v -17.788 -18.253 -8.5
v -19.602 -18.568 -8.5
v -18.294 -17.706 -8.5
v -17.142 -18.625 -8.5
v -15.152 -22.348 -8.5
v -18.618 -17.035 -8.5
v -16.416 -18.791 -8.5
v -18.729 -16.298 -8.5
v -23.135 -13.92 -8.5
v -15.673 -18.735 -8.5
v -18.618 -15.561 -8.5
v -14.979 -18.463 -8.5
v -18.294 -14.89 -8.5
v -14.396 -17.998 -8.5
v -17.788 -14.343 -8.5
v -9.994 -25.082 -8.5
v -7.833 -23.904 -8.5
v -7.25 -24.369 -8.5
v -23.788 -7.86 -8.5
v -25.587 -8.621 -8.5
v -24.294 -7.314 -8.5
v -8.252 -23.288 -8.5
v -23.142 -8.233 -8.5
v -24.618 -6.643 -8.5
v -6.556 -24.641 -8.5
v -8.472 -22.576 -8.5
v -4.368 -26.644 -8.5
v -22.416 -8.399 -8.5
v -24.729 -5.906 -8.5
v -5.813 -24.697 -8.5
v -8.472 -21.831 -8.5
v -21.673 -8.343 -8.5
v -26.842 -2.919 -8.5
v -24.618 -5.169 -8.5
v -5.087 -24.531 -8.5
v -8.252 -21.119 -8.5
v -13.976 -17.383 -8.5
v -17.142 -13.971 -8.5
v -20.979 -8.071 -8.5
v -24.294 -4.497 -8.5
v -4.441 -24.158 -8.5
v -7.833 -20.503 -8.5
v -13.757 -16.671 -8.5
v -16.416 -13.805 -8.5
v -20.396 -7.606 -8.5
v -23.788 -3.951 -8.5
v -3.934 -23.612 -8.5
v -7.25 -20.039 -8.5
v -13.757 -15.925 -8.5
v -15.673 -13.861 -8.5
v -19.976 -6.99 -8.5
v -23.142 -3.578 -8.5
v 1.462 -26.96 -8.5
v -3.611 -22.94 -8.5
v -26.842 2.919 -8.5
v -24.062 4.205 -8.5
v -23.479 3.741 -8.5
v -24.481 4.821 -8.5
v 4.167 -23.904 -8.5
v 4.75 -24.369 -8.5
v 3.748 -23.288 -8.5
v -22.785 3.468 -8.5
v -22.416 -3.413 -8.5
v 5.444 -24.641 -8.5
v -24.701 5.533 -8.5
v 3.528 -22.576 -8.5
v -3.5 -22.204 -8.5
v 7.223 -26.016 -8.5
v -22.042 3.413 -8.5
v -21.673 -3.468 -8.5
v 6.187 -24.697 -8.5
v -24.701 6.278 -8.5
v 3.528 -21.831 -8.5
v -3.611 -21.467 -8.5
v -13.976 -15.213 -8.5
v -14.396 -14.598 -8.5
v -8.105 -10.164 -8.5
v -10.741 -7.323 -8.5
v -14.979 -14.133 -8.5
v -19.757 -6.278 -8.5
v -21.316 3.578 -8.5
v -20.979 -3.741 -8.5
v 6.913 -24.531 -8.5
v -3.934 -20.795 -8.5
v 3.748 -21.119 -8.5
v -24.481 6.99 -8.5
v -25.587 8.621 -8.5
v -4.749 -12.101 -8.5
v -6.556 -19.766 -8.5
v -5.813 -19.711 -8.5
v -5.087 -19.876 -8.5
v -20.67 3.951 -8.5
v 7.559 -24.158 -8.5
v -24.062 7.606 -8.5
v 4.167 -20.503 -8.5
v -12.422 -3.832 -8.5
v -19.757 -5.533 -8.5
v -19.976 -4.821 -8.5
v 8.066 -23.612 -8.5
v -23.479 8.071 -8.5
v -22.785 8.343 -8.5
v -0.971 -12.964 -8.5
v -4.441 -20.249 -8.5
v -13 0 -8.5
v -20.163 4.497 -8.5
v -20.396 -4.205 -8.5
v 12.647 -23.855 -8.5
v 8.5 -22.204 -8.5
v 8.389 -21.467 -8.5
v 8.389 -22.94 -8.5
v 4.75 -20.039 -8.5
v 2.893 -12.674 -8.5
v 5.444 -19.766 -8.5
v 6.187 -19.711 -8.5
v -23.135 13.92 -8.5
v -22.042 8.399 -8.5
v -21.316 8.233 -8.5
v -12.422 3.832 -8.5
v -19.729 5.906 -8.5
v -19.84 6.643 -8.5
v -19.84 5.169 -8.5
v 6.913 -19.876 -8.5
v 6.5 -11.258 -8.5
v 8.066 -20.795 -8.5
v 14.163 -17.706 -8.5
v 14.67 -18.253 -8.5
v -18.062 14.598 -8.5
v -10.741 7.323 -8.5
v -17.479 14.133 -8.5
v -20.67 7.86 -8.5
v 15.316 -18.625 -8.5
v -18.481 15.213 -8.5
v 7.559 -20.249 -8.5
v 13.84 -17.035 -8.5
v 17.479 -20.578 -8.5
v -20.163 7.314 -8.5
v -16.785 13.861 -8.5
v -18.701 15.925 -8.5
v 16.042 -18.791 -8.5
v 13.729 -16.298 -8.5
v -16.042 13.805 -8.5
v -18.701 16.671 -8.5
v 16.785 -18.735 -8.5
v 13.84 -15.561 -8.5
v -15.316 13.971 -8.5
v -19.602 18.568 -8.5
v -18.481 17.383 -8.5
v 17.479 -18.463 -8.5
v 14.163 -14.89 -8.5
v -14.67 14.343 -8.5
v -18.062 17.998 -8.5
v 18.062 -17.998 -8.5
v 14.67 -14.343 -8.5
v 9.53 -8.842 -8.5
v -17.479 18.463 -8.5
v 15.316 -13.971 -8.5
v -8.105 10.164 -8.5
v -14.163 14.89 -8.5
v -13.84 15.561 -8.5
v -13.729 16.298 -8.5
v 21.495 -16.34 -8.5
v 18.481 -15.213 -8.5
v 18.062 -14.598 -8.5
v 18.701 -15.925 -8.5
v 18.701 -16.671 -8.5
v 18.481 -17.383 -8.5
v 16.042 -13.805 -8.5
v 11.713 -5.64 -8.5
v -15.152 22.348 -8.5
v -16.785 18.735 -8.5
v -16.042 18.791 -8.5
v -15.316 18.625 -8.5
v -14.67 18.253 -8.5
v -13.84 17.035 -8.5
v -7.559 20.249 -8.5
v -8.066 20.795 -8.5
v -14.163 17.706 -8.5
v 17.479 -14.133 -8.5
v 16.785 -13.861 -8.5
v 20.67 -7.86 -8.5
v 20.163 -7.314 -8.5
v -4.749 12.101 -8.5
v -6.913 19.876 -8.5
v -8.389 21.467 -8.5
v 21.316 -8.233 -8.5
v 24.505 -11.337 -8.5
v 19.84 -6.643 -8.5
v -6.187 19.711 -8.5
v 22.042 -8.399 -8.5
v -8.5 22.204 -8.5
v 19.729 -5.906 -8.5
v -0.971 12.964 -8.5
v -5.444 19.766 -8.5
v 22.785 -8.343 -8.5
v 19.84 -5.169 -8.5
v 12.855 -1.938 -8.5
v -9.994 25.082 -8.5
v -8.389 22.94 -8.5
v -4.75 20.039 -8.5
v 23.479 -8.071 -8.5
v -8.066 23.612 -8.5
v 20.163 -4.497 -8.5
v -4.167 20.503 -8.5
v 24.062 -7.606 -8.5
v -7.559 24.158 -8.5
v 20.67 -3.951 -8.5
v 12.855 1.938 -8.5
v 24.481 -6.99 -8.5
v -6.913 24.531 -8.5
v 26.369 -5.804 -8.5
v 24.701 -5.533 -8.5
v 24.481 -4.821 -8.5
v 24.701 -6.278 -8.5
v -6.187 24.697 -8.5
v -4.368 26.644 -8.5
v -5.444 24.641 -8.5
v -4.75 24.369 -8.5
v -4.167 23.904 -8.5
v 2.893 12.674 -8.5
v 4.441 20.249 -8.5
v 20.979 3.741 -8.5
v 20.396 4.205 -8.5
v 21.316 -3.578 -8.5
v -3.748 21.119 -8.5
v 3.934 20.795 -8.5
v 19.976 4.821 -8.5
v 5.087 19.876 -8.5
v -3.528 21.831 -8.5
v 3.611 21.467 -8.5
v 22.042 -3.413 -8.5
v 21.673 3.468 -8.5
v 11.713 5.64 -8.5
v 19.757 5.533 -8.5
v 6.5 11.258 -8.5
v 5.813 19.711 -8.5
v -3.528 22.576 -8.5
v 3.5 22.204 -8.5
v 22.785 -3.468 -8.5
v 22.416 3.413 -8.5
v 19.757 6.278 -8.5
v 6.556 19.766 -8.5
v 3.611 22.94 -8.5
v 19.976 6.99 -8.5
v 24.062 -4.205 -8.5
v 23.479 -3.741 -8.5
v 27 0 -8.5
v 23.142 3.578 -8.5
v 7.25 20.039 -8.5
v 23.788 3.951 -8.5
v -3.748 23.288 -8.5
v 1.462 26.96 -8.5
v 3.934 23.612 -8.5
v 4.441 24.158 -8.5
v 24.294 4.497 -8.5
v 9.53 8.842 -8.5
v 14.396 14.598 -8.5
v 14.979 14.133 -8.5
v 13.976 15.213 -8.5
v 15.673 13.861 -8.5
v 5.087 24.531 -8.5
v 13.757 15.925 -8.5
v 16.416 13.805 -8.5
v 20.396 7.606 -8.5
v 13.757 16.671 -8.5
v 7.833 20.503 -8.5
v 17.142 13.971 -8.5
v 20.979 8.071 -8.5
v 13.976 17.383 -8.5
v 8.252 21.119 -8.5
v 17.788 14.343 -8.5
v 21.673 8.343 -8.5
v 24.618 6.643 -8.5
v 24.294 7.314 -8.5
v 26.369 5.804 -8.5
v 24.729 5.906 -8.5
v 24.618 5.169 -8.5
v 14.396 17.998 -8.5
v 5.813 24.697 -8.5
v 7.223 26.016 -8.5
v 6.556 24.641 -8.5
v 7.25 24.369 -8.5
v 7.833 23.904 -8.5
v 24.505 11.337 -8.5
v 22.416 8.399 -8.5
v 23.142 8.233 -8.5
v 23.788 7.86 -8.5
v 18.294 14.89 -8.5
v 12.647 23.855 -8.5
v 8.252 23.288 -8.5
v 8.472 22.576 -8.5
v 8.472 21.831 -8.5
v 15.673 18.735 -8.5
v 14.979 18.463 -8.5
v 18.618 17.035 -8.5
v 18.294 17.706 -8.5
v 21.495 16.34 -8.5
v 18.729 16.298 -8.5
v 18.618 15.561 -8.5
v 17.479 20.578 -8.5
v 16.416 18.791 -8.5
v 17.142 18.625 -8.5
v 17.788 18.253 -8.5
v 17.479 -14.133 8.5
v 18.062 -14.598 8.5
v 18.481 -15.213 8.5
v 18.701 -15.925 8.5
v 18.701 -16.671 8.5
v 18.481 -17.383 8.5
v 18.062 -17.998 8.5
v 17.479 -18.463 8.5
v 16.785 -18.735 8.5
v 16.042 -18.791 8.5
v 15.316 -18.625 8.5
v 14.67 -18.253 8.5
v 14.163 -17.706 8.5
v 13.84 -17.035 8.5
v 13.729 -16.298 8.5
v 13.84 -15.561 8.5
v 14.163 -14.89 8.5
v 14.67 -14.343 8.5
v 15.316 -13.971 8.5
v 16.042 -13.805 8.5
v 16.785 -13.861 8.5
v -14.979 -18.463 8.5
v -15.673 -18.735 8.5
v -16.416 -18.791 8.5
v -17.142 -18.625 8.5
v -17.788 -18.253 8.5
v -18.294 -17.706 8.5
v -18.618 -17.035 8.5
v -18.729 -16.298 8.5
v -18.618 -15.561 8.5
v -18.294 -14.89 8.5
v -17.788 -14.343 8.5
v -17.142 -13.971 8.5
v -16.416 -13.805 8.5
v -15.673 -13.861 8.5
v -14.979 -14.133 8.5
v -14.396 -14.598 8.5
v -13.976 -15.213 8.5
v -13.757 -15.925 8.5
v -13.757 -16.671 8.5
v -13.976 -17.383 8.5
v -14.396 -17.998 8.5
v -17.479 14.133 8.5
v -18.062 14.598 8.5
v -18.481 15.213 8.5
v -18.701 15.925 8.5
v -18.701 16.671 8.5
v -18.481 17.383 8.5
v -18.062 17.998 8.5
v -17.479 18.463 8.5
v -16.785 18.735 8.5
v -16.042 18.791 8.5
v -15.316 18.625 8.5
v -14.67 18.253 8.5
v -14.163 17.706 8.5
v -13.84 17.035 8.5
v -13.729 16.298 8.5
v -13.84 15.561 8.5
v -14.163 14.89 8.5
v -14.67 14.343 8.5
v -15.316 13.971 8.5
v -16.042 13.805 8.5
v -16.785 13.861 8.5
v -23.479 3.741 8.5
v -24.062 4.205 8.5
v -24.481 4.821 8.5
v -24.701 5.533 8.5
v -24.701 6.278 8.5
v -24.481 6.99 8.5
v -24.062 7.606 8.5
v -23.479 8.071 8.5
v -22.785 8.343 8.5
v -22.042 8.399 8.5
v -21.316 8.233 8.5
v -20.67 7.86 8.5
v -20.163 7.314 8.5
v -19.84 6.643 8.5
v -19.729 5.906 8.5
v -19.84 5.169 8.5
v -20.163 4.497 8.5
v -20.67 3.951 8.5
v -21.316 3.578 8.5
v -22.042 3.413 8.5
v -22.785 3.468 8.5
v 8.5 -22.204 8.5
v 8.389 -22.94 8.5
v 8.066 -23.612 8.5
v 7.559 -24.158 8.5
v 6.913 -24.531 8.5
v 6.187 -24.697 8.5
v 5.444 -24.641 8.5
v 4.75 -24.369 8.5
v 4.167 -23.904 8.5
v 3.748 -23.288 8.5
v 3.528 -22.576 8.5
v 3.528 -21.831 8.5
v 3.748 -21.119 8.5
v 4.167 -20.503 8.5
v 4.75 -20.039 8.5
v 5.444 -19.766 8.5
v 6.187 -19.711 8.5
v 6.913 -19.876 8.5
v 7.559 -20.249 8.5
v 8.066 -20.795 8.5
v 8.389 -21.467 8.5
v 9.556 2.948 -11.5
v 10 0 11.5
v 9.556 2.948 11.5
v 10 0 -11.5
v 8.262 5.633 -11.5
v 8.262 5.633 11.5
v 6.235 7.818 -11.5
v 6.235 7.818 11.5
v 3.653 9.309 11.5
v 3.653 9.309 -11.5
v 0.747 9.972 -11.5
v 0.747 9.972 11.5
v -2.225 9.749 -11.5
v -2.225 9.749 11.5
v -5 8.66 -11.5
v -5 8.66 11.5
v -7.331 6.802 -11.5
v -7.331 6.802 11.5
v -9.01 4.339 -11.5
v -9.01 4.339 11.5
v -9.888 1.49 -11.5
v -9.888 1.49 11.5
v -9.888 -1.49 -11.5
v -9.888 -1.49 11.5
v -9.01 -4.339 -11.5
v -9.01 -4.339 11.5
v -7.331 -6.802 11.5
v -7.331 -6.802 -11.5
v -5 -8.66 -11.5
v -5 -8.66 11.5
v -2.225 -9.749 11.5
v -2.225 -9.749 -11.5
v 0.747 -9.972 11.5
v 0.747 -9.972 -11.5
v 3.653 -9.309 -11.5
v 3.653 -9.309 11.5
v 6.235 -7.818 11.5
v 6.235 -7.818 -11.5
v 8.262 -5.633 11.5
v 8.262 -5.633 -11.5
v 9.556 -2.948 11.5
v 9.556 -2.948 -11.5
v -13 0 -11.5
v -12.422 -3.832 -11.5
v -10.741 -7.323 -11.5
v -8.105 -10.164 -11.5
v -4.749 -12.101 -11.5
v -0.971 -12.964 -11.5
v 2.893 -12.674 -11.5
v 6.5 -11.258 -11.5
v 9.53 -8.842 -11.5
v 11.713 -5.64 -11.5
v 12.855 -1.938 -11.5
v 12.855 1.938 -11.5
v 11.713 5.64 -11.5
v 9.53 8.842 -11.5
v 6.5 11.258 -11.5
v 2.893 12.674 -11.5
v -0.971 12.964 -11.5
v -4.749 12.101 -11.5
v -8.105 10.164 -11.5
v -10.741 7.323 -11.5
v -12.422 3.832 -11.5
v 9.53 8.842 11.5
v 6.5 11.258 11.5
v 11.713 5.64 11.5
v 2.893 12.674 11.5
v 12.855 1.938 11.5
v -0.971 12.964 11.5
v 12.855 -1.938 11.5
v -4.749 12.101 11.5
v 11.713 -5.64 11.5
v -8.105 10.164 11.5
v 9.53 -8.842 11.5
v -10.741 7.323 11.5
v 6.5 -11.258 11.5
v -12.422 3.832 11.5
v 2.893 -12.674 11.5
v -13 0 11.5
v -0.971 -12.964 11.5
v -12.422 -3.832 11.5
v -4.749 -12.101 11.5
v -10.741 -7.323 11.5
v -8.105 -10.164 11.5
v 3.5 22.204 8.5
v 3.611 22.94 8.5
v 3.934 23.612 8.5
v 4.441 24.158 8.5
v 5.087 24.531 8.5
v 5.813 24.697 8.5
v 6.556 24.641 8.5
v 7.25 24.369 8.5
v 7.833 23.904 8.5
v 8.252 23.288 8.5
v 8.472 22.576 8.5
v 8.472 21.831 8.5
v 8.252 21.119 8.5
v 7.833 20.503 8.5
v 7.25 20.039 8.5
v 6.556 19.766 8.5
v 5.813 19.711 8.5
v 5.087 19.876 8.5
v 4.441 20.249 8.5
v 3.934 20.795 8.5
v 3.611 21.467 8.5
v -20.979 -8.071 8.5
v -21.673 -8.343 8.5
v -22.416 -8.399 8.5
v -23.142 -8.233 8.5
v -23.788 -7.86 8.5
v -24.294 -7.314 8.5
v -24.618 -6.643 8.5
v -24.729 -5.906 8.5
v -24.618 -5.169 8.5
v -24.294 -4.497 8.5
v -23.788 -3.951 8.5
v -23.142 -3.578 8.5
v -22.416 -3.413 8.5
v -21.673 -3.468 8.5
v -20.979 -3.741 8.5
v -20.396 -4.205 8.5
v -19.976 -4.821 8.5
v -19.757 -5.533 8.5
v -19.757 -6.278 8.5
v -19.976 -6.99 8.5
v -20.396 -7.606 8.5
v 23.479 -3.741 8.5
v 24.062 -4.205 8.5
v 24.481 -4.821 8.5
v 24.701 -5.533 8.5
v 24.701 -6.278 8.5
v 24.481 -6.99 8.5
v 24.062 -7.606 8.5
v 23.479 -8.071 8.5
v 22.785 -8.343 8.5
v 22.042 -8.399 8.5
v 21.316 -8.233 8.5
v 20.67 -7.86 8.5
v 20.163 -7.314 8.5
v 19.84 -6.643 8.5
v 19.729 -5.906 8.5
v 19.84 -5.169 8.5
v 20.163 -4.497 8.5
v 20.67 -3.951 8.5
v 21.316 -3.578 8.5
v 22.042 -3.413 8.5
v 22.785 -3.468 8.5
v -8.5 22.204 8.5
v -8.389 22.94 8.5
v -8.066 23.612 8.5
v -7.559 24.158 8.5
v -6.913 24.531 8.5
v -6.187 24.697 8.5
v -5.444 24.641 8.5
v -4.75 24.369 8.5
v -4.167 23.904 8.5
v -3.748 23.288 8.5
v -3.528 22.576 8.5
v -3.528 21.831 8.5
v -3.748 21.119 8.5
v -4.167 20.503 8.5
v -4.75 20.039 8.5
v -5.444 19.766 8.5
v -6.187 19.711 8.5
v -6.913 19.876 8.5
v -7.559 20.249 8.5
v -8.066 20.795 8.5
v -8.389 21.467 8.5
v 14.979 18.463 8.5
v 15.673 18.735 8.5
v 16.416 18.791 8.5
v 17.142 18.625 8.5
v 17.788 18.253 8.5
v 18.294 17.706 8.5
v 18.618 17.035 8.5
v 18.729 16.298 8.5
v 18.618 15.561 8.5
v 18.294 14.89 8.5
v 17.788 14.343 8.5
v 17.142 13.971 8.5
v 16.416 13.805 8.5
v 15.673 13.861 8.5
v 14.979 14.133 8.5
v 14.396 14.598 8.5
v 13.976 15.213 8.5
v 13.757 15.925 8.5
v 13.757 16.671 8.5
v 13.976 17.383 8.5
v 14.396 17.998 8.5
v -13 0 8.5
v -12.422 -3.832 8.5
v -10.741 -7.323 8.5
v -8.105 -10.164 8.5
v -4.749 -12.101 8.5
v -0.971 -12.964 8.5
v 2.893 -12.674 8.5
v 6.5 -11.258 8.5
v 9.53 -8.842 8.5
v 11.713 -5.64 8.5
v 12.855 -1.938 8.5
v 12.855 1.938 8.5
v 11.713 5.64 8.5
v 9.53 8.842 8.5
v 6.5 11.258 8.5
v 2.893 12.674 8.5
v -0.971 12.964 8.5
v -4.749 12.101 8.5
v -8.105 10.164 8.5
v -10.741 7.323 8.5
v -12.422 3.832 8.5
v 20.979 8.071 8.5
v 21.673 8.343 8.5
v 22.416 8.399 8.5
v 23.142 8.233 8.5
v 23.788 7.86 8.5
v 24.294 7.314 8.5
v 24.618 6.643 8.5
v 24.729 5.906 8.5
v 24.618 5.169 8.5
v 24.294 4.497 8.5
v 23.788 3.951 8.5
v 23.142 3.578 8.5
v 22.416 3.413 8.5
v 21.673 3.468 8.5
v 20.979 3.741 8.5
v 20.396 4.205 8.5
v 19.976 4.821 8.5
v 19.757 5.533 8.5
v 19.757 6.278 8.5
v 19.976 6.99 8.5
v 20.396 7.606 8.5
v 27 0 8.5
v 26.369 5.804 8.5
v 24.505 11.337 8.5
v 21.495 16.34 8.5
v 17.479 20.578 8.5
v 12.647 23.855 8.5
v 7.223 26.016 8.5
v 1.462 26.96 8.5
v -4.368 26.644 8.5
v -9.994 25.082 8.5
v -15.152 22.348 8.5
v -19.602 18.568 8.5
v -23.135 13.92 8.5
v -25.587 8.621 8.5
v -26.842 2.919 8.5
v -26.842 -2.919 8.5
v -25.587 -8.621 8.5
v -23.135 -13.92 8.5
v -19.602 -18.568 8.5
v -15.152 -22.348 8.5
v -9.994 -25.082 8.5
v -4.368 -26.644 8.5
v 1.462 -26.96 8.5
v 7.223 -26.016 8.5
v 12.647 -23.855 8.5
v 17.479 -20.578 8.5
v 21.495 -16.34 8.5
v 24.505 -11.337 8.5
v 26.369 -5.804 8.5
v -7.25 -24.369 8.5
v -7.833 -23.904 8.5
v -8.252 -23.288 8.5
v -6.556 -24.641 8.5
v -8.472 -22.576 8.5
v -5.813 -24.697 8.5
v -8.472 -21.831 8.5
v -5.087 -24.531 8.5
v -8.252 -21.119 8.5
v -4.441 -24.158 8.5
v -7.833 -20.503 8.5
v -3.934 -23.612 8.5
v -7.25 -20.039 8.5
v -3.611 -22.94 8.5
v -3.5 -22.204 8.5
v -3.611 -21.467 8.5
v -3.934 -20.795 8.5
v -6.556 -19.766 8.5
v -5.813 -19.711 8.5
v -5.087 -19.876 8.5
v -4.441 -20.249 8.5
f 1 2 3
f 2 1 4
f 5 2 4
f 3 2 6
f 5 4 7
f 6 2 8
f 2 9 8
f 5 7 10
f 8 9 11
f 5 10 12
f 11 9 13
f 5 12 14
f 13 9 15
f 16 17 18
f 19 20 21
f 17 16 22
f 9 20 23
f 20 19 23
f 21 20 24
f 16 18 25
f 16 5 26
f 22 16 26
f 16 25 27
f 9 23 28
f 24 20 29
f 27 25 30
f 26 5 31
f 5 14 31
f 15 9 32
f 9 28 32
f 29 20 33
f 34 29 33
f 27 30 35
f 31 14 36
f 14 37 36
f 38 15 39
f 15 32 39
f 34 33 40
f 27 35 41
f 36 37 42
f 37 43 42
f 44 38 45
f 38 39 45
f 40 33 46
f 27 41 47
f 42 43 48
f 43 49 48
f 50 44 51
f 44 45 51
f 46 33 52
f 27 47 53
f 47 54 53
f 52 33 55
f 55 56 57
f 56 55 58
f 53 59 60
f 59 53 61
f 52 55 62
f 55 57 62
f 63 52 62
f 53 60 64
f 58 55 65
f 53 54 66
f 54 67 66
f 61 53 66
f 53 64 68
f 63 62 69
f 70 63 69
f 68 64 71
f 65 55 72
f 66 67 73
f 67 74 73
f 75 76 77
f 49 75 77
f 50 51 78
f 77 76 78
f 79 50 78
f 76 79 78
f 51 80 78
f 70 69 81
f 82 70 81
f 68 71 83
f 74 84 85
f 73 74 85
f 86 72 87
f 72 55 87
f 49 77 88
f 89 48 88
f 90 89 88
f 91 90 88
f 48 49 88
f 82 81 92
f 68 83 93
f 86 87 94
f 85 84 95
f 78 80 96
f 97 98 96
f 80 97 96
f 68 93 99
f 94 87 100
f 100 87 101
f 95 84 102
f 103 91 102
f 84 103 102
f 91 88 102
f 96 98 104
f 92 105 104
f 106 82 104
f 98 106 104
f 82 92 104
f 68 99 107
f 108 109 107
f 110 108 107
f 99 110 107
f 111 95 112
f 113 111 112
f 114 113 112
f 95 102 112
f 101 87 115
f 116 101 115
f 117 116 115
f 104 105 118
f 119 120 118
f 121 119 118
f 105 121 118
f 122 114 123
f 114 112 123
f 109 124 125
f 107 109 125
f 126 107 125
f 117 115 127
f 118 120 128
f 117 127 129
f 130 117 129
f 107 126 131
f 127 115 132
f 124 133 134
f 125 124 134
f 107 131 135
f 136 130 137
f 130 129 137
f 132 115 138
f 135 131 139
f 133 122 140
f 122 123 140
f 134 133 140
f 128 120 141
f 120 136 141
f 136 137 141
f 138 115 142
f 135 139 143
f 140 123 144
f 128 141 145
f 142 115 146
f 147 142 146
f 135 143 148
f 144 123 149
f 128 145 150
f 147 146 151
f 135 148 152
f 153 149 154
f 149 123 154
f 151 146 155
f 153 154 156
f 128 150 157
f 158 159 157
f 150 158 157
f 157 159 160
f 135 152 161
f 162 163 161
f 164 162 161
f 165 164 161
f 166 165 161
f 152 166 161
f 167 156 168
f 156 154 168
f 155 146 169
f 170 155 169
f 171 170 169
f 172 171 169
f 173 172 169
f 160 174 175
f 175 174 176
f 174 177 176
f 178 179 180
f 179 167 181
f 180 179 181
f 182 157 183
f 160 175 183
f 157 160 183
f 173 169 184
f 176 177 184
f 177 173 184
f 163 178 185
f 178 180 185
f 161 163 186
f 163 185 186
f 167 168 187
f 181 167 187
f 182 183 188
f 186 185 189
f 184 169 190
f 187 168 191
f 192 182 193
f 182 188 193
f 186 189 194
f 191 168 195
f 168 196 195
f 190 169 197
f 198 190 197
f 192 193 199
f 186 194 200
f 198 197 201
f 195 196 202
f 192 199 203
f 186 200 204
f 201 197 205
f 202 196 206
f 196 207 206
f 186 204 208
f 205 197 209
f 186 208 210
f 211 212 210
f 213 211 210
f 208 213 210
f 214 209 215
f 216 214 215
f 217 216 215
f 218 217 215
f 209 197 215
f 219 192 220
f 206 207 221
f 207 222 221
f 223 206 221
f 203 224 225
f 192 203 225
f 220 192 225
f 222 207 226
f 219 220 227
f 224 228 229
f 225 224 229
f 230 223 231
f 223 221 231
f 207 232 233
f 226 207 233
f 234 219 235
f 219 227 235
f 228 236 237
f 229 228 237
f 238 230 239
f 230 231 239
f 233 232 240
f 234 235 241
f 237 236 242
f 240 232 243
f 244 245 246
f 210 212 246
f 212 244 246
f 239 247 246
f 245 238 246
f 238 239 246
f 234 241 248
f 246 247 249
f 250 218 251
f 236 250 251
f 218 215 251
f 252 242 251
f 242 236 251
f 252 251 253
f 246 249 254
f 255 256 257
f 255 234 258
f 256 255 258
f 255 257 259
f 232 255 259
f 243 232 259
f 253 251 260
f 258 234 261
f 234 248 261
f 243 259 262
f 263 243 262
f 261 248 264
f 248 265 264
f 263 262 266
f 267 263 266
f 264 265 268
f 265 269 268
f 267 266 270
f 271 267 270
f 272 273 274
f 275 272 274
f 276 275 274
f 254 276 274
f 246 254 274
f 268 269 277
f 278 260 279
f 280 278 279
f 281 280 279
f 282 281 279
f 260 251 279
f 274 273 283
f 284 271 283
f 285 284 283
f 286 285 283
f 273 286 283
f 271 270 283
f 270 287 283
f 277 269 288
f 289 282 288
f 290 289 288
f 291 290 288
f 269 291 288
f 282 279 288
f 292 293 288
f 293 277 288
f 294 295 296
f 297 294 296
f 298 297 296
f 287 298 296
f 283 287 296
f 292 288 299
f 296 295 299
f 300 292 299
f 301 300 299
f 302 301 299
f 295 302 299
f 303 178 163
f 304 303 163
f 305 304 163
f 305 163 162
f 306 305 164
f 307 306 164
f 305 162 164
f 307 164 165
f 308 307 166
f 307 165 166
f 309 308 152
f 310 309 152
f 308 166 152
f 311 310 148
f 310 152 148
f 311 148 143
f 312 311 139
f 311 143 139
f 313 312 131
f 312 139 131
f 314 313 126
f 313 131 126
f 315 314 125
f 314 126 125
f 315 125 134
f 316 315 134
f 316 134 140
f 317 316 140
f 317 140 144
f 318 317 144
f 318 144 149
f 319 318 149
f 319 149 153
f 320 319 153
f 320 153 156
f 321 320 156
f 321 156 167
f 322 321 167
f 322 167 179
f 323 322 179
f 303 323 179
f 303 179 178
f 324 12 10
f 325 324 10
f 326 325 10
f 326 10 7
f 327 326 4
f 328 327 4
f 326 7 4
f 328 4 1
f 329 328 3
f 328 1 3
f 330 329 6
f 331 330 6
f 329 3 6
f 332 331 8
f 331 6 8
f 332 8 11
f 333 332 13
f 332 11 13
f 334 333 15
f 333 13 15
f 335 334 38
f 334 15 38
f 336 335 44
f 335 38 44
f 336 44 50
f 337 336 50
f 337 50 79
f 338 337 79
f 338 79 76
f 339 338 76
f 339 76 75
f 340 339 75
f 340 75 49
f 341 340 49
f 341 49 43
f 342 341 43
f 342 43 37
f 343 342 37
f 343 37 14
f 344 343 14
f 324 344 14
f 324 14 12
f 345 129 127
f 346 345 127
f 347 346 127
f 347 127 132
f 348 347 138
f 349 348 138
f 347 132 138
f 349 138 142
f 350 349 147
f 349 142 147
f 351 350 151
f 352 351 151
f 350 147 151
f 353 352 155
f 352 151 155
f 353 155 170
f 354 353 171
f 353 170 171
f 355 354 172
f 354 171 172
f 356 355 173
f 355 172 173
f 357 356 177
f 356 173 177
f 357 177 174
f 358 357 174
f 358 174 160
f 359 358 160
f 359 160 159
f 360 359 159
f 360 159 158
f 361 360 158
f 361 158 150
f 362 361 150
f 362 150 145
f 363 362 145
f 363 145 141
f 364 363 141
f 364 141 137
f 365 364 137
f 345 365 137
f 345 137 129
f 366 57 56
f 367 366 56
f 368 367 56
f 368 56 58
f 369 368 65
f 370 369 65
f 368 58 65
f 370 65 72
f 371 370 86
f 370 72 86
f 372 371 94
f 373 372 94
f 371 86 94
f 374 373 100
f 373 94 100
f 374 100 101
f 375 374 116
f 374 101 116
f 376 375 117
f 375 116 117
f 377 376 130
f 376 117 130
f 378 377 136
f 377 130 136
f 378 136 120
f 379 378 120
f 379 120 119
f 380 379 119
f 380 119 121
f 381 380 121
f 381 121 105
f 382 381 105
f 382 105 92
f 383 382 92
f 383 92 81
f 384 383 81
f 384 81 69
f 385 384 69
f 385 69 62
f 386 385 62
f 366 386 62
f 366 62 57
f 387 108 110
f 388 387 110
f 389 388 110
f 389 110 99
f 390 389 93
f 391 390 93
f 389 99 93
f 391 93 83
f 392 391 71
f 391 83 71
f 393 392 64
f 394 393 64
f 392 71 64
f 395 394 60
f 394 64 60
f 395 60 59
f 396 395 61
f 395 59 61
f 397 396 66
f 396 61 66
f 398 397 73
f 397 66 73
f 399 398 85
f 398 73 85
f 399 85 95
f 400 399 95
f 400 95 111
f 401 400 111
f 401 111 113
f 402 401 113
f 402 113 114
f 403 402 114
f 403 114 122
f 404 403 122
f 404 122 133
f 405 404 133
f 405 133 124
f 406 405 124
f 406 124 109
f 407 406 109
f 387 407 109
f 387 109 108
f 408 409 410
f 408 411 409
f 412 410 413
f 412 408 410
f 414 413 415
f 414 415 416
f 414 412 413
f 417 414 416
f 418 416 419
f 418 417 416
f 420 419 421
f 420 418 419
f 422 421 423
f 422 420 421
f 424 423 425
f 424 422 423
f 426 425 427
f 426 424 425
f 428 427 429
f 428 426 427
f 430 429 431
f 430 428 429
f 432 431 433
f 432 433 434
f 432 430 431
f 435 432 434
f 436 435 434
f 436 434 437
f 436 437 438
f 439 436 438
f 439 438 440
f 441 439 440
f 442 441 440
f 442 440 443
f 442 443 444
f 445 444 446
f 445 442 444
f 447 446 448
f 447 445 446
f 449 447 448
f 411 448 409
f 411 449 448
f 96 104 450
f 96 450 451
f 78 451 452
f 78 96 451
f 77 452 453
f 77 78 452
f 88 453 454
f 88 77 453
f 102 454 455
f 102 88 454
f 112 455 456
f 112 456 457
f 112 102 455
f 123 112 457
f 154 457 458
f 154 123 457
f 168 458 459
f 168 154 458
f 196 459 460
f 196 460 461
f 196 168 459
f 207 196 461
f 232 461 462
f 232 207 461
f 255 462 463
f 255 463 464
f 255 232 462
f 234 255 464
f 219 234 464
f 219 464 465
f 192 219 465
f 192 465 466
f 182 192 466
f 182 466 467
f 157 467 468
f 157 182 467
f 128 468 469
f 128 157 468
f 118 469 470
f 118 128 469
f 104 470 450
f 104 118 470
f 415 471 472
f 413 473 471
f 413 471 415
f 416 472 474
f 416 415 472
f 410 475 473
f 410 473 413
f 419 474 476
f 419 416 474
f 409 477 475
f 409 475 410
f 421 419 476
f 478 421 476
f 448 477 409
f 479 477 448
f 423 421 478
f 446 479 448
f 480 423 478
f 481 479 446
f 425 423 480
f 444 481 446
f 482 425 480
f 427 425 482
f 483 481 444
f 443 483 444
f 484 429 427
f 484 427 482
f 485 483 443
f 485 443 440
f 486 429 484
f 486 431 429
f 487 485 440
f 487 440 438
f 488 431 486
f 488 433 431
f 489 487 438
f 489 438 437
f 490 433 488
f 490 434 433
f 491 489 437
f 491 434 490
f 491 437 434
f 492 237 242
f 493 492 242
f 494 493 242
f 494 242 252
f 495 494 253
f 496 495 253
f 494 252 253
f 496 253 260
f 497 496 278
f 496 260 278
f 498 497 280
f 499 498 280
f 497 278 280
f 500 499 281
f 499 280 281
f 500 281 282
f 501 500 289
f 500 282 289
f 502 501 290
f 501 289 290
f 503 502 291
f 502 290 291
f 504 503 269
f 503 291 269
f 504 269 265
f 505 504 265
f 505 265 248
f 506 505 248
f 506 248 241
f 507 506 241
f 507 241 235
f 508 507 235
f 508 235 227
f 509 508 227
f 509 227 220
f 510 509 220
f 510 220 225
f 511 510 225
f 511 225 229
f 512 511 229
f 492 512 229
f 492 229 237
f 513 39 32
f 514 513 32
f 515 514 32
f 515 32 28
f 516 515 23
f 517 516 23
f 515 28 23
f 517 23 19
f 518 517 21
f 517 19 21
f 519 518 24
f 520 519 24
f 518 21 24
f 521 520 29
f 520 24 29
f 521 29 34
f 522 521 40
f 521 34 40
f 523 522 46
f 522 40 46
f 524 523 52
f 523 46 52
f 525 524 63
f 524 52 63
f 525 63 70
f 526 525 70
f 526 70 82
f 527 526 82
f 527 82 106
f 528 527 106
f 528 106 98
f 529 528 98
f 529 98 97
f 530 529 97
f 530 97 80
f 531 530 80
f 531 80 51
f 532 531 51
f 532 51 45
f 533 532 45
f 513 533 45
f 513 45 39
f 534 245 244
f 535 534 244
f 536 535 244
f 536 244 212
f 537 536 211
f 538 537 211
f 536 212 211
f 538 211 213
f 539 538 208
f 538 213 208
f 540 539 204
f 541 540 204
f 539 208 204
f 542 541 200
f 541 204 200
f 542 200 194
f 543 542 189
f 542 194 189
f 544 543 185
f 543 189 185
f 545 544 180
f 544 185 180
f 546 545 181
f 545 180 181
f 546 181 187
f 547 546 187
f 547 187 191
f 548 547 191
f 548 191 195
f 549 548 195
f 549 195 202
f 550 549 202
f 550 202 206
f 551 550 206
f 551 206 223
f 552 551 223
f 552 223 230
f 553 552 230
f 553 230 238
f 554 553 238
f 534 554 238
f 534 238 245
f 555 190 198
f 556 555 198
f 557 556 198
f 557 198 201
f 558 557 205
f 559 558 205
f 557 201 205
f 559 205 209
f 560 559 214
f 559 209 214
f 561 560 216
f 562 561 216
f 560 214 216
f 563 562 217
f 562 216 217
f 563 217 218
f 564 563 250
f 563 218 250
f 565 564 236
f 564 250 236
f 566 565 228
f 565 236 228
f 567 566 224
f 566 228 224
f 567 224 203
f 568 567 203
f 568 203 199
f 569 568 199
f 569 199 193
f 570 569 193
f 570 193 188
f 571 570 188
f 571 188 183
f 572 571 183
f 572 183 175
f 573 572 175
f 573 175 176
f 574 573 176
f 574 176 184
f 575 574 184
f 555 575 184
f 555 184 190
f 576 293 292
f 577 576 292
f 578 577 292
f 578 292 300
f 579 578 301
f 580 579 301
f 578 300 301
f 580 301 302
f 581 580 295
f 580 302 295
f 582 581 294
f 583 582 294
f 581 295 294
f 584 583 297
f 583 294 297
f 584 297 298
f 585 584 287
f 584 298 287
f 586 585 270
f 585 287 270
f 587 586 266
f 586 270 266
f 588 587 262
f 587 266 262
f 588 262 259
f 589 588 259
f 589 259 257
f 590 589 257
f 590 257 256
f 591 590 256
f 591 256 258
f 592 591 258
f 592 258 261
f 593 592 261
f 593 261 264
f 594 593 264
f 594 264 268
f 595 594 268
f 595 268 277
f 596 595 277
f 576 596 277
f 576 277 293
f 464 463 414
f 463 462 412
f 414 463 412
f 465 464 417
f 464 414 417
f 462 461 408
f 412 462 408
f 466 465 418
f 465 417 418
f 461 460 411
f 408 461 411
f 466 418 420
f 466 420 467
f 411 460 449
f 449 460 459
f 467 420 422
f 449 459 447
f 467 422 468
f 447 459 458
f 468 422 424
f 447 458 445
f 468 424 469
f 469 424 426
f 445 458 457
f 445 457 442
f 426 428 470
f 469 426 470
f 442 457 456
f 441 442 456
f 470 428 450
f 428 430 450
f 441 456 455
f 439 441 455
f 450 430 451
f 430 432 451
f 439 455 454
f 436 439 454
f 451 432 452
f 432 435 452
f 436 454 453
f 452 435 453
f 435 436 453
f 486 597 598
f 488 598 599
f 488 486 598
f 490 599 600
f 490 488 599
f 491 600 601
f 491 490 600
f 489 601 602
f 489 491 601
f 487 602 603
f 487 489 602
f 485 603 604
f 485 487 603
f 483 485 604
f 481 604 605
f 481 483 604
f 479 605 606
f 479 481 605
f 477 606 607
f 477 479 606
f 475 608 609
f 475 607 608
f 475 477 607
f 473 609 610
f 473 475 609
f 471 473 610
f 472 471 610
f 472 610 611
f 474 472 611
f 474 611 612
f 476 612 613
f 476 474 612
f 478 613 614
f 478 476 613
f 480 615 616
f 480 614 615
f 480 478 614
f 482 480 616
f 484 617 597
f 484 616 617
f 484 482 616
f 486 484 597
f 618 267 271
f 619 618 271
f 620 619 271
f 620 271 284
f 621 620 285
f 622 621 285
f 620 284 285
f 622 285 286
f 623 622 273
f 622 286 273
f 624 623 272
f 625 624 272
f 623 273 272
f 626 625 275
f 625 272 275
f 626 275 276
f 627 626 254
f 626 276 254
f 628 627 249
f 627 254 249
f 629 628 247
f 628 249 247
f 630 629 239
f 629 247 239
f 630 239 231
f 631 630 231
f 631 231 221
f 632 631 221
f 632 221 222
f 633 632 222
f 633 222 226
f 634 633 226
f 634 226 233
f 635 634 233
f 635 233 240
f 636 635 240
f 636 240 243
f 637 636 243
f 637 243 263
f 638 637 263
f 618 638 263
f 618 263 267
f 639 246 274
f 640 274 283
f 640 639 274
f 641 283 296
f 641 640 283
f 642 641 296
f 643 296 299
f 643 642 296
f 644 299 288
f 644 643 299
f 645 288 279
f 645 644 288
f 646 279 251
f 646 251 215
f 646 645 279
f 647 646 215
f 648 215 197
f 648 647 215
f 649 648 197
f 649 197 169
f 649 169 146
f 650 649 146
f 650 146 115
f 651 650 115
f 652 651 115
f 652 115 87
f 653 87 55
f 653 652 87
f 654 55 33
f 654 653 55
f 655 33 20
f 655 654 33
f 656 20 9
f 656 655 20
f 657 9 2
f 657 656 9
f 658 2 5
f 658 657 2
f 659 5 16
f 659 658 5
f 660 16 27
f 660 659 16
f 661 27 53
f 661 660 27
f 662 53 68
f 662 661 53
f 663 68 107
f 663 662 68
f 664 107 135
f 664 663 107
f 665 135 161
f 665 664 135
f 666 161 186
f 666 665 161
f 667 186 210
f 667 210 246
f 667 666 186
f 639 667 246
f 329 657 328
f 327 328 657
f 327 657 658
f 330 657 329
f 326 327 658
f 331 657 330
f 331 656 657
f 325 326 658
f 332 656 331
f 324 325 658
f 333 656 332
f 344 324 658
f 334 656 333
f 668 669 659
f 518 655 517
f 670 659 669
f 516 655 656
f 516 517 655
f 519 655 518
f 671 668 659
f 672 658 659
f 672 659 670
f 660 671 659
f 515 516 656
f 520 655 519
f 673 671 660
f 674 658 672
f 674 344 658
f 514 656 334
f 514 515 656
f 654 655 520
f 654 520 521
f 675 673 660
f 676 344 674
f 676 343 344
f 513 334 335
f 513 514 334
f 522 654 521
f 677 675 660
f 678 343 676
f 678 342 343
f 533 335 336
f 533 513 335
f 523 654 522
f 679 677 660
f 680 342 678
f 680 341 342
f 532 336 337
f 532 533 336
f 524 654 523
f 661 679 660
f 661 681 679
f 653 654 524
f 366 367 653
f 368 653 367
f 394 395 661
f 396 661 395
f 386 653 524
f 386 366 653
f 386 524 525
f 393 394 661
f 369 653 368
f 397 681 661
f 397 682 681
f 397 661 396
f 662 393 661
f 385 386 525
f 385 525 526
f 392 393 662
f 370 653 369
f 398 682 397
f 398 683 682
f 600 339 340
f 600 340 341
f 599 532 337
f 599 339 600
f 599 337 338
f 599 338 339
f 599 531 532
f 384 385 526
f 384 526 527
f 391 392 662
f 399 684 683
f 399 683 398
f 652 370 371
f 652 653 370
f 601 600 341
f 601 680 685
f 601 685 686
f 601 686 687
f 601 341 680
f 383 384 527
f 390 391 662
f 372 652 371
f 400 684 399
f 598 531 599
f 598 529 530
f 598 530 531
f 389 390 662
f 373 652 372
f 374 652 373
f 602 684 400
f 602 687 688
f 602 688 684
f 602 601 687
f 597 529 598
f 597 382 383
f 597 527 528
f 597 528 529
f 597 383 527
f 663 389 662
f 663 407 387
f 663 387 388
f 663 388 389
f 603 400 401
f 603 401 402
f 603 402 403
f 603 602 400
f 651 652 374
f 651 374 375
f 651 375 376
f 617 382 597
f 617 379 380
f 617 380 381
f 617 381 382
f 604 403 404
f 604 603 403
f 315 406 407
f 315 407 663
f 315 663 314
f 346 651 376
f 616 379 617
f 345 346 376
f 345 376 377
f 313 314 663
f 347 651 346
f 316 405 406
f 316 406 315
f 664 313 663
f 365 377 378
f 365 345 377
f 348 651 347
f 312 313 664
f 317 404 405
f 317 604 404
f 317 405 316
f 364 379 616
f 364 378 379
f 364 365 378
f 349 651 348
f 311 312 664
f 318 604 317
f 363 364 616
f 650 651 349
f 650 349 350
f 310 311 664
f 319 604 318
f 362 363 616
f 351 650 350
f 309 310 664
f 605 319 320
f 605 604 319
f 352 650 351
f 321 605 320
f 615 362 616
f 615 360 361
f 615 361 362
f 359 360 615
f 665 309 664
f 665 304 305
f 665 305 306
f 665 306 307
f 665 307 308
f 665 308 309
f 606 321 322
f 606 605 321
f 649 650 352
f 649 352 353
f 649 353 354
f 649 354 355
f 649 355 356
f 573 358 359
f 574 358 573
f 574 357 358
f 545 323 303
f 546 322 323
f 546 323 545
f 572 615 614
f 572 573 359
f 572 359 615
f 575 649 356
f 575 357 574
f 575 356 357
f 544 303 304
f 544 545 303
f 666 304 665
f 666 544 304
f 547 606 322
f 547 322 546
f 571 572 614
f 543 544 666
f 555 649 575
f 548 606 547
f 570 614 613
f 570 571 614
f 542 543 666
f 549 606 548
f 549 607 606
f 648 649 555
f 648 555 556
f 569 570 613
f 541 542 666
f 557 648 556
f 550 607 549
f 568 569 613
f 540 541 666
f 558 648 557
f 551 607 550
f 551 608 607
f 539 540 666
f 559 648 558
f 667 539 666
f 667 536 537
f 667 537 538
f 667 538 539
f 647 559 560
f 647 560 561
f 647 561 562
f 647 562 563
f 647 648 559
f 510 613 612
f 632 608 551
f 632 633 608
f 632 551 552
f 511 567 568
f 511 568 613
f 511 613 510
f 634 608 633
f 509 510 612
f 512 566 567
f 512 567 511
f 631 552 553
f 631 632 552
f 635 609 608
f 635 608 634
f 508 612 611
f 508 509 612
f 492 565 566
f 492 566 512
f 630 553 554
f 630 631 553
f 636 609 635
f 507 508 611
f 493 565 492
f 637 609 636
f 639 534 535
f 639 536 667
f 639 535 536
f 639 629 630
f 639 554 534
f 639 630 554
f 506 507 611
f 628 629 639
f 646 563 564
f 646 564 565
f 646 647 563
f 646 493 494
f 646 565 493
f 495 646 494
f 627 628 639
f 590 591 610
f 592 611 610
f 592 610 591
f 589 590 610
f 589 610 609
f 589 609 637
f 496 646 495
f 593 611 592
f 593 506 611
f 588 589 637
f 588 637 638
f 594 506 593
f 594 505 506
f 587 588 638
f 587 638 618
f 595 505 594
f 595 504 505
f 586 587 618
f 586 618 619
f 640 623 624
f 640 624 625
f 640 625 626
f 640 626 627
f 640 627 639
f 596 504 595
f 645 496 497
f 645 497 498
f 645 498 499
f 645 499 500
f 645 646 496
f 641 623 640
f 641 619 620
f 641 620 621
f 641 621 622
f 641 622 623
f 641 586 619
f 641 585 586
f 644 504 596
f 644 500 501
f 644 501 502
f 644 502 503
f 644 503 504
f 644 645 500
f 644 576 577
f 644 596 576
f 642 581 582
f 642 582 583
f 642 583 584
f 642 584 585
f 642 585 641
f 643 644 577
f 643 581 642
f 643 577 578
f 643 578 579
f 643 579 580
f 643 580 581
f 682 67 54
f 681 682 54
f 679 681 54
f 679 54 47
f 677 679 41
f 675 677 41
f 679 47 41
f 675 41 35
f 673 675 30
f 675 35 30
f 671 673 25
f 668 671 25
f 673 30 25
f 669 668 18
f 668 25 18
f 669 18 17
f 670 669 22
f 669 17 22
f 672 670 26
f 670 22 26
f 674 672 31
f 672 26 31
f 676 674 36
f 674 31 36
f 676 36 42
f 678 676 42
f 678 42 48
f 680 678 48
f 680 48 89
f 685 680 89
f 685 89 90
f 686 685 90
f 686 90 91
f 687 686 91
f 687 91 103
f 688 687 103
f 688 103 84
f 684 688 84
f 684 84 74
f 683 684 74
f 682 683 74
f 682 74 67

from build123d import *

# Parameters (mm, degrees)
SKETCH_3_R               = 27
EXTRUDE_1_DEPTH          = 8.5
SKETCH_5_R               = 13
CUT_EXTRUDE_2_DEPTH      = 42.797129088
SKETCH_8_R               = 13
SKETCH_8_R_2             = 10
EXTRUDE_2_DEPTH          = 11.5
CUT_EXTRUDE_3_REACH      = 45.105
SKETCH_9_R               = 2.5
PATTERN_CIRCULAR_2_COUNT = 6


with BuildPart() as part:
    # 草图3 → 凸台-拉伸1 (new, symmetric)
    with BuildSketch(Plane.XY):
        Circle(SKETCH_3_R)
    extrude(amount=EXTRUDE_1_DEPTH, both=True)

    # 草图5 → 切除-拉伸2 (cut, through all)
    with BuildSketch(Plane(origin=(0, 0, -8.5), x_dir=(-1, 0, 0), z_dir=(0, 0, -1))):
        Circle(SKETCH_5_R)
    extrude(amount=-CUT_EXTRUDE_2_DEPTH, mode=Mode.SUBTRACT)

    # 草图8 → 凸台-拉伸2 (add, symmetric)
    with BuildSketch(Plane.XY):
        with Locations(Location((0, 0, 0), (0, 0, 180))):
            Circle(SKETCH_8_R)
        Circle(SKETCH_8_R_2, mode=Mode.SUBTRACT)
    extrude(amount=EXTRUDE_2_DEPTH, both=True)

    # 草图9 → 切除-拉伸3 (cut, up to next)
    with BuildSketch(Plane(origin=(0, 0, -8.5), x_dir=(-1, 0, 0), z_dir=(0, 0, -1)), mode=Mode.PRIVATE) as cut_extrude_3_sk1:
        with Locations((-6, 22.203603311)):
            Circle(SKETCH_9_R)
    cut_extrude_3_tool1 = extrude(cut_extrude_3_sk1.sketch, amount=-CUT_EXTRUDE_3_REACH, mode=Mode.PRIVATE) & part.part
    # 草图9 → 切除-拉伸3 (cut, up to next)
    with BuildSketch(Plane(origin=(0, 0, -8.5), x_dir=(-1, 0, 0), z_dir=(0, 0, -1)), mode=Mode.PRIVATE) as cut_extrude_3_sk2:
        with Locations((6, 22.203603311)):
            Circle(SKETCH_9_R)
    cut_extrude_3_tool2 = extrude(cut_extrude_3_sk2.sketch, amount=-CUT_EXTRUDE_3_REACH, mode=Mode.PRIVATE) & part.part
    cut_extrude_3_1 = cut_extrude_3_tool1.solids().sort_by_distance((6, 22.203603, -8.5))[0]
    add(cut_extrude_3_1, mode=Mode.SUBTRACT)
    cut_extrude_3_2 = cut_extrude_3_tool2.solids().sort_by_distance((-6, 22.203603, -8.5))[0]
    add(cut_extrude_3_2, mode=Mode.SUBTRACT)
    cut_extrude_3 = cut_extrude_3_1 + cut_extrude_3_2  # 切除-拉伸3 as one shape, for the pattern or mirror that repeats it

    # 阵列(圆周)2: 切除-拉伸3 ×6 about axis
    pattern_circular_2_axis = Axis((0, 0, 0), (0, 0, 1))
    for i in range(1, PATTERN_CIRCULAR_2_COUNT):
        add(cut_extrude_3.rotate(pattern_circular_2_axis, i * 360 / PATTERN_CIRCULAR_2_COUNT), mode=Mode.SUBTRACT)


solid = part.part
